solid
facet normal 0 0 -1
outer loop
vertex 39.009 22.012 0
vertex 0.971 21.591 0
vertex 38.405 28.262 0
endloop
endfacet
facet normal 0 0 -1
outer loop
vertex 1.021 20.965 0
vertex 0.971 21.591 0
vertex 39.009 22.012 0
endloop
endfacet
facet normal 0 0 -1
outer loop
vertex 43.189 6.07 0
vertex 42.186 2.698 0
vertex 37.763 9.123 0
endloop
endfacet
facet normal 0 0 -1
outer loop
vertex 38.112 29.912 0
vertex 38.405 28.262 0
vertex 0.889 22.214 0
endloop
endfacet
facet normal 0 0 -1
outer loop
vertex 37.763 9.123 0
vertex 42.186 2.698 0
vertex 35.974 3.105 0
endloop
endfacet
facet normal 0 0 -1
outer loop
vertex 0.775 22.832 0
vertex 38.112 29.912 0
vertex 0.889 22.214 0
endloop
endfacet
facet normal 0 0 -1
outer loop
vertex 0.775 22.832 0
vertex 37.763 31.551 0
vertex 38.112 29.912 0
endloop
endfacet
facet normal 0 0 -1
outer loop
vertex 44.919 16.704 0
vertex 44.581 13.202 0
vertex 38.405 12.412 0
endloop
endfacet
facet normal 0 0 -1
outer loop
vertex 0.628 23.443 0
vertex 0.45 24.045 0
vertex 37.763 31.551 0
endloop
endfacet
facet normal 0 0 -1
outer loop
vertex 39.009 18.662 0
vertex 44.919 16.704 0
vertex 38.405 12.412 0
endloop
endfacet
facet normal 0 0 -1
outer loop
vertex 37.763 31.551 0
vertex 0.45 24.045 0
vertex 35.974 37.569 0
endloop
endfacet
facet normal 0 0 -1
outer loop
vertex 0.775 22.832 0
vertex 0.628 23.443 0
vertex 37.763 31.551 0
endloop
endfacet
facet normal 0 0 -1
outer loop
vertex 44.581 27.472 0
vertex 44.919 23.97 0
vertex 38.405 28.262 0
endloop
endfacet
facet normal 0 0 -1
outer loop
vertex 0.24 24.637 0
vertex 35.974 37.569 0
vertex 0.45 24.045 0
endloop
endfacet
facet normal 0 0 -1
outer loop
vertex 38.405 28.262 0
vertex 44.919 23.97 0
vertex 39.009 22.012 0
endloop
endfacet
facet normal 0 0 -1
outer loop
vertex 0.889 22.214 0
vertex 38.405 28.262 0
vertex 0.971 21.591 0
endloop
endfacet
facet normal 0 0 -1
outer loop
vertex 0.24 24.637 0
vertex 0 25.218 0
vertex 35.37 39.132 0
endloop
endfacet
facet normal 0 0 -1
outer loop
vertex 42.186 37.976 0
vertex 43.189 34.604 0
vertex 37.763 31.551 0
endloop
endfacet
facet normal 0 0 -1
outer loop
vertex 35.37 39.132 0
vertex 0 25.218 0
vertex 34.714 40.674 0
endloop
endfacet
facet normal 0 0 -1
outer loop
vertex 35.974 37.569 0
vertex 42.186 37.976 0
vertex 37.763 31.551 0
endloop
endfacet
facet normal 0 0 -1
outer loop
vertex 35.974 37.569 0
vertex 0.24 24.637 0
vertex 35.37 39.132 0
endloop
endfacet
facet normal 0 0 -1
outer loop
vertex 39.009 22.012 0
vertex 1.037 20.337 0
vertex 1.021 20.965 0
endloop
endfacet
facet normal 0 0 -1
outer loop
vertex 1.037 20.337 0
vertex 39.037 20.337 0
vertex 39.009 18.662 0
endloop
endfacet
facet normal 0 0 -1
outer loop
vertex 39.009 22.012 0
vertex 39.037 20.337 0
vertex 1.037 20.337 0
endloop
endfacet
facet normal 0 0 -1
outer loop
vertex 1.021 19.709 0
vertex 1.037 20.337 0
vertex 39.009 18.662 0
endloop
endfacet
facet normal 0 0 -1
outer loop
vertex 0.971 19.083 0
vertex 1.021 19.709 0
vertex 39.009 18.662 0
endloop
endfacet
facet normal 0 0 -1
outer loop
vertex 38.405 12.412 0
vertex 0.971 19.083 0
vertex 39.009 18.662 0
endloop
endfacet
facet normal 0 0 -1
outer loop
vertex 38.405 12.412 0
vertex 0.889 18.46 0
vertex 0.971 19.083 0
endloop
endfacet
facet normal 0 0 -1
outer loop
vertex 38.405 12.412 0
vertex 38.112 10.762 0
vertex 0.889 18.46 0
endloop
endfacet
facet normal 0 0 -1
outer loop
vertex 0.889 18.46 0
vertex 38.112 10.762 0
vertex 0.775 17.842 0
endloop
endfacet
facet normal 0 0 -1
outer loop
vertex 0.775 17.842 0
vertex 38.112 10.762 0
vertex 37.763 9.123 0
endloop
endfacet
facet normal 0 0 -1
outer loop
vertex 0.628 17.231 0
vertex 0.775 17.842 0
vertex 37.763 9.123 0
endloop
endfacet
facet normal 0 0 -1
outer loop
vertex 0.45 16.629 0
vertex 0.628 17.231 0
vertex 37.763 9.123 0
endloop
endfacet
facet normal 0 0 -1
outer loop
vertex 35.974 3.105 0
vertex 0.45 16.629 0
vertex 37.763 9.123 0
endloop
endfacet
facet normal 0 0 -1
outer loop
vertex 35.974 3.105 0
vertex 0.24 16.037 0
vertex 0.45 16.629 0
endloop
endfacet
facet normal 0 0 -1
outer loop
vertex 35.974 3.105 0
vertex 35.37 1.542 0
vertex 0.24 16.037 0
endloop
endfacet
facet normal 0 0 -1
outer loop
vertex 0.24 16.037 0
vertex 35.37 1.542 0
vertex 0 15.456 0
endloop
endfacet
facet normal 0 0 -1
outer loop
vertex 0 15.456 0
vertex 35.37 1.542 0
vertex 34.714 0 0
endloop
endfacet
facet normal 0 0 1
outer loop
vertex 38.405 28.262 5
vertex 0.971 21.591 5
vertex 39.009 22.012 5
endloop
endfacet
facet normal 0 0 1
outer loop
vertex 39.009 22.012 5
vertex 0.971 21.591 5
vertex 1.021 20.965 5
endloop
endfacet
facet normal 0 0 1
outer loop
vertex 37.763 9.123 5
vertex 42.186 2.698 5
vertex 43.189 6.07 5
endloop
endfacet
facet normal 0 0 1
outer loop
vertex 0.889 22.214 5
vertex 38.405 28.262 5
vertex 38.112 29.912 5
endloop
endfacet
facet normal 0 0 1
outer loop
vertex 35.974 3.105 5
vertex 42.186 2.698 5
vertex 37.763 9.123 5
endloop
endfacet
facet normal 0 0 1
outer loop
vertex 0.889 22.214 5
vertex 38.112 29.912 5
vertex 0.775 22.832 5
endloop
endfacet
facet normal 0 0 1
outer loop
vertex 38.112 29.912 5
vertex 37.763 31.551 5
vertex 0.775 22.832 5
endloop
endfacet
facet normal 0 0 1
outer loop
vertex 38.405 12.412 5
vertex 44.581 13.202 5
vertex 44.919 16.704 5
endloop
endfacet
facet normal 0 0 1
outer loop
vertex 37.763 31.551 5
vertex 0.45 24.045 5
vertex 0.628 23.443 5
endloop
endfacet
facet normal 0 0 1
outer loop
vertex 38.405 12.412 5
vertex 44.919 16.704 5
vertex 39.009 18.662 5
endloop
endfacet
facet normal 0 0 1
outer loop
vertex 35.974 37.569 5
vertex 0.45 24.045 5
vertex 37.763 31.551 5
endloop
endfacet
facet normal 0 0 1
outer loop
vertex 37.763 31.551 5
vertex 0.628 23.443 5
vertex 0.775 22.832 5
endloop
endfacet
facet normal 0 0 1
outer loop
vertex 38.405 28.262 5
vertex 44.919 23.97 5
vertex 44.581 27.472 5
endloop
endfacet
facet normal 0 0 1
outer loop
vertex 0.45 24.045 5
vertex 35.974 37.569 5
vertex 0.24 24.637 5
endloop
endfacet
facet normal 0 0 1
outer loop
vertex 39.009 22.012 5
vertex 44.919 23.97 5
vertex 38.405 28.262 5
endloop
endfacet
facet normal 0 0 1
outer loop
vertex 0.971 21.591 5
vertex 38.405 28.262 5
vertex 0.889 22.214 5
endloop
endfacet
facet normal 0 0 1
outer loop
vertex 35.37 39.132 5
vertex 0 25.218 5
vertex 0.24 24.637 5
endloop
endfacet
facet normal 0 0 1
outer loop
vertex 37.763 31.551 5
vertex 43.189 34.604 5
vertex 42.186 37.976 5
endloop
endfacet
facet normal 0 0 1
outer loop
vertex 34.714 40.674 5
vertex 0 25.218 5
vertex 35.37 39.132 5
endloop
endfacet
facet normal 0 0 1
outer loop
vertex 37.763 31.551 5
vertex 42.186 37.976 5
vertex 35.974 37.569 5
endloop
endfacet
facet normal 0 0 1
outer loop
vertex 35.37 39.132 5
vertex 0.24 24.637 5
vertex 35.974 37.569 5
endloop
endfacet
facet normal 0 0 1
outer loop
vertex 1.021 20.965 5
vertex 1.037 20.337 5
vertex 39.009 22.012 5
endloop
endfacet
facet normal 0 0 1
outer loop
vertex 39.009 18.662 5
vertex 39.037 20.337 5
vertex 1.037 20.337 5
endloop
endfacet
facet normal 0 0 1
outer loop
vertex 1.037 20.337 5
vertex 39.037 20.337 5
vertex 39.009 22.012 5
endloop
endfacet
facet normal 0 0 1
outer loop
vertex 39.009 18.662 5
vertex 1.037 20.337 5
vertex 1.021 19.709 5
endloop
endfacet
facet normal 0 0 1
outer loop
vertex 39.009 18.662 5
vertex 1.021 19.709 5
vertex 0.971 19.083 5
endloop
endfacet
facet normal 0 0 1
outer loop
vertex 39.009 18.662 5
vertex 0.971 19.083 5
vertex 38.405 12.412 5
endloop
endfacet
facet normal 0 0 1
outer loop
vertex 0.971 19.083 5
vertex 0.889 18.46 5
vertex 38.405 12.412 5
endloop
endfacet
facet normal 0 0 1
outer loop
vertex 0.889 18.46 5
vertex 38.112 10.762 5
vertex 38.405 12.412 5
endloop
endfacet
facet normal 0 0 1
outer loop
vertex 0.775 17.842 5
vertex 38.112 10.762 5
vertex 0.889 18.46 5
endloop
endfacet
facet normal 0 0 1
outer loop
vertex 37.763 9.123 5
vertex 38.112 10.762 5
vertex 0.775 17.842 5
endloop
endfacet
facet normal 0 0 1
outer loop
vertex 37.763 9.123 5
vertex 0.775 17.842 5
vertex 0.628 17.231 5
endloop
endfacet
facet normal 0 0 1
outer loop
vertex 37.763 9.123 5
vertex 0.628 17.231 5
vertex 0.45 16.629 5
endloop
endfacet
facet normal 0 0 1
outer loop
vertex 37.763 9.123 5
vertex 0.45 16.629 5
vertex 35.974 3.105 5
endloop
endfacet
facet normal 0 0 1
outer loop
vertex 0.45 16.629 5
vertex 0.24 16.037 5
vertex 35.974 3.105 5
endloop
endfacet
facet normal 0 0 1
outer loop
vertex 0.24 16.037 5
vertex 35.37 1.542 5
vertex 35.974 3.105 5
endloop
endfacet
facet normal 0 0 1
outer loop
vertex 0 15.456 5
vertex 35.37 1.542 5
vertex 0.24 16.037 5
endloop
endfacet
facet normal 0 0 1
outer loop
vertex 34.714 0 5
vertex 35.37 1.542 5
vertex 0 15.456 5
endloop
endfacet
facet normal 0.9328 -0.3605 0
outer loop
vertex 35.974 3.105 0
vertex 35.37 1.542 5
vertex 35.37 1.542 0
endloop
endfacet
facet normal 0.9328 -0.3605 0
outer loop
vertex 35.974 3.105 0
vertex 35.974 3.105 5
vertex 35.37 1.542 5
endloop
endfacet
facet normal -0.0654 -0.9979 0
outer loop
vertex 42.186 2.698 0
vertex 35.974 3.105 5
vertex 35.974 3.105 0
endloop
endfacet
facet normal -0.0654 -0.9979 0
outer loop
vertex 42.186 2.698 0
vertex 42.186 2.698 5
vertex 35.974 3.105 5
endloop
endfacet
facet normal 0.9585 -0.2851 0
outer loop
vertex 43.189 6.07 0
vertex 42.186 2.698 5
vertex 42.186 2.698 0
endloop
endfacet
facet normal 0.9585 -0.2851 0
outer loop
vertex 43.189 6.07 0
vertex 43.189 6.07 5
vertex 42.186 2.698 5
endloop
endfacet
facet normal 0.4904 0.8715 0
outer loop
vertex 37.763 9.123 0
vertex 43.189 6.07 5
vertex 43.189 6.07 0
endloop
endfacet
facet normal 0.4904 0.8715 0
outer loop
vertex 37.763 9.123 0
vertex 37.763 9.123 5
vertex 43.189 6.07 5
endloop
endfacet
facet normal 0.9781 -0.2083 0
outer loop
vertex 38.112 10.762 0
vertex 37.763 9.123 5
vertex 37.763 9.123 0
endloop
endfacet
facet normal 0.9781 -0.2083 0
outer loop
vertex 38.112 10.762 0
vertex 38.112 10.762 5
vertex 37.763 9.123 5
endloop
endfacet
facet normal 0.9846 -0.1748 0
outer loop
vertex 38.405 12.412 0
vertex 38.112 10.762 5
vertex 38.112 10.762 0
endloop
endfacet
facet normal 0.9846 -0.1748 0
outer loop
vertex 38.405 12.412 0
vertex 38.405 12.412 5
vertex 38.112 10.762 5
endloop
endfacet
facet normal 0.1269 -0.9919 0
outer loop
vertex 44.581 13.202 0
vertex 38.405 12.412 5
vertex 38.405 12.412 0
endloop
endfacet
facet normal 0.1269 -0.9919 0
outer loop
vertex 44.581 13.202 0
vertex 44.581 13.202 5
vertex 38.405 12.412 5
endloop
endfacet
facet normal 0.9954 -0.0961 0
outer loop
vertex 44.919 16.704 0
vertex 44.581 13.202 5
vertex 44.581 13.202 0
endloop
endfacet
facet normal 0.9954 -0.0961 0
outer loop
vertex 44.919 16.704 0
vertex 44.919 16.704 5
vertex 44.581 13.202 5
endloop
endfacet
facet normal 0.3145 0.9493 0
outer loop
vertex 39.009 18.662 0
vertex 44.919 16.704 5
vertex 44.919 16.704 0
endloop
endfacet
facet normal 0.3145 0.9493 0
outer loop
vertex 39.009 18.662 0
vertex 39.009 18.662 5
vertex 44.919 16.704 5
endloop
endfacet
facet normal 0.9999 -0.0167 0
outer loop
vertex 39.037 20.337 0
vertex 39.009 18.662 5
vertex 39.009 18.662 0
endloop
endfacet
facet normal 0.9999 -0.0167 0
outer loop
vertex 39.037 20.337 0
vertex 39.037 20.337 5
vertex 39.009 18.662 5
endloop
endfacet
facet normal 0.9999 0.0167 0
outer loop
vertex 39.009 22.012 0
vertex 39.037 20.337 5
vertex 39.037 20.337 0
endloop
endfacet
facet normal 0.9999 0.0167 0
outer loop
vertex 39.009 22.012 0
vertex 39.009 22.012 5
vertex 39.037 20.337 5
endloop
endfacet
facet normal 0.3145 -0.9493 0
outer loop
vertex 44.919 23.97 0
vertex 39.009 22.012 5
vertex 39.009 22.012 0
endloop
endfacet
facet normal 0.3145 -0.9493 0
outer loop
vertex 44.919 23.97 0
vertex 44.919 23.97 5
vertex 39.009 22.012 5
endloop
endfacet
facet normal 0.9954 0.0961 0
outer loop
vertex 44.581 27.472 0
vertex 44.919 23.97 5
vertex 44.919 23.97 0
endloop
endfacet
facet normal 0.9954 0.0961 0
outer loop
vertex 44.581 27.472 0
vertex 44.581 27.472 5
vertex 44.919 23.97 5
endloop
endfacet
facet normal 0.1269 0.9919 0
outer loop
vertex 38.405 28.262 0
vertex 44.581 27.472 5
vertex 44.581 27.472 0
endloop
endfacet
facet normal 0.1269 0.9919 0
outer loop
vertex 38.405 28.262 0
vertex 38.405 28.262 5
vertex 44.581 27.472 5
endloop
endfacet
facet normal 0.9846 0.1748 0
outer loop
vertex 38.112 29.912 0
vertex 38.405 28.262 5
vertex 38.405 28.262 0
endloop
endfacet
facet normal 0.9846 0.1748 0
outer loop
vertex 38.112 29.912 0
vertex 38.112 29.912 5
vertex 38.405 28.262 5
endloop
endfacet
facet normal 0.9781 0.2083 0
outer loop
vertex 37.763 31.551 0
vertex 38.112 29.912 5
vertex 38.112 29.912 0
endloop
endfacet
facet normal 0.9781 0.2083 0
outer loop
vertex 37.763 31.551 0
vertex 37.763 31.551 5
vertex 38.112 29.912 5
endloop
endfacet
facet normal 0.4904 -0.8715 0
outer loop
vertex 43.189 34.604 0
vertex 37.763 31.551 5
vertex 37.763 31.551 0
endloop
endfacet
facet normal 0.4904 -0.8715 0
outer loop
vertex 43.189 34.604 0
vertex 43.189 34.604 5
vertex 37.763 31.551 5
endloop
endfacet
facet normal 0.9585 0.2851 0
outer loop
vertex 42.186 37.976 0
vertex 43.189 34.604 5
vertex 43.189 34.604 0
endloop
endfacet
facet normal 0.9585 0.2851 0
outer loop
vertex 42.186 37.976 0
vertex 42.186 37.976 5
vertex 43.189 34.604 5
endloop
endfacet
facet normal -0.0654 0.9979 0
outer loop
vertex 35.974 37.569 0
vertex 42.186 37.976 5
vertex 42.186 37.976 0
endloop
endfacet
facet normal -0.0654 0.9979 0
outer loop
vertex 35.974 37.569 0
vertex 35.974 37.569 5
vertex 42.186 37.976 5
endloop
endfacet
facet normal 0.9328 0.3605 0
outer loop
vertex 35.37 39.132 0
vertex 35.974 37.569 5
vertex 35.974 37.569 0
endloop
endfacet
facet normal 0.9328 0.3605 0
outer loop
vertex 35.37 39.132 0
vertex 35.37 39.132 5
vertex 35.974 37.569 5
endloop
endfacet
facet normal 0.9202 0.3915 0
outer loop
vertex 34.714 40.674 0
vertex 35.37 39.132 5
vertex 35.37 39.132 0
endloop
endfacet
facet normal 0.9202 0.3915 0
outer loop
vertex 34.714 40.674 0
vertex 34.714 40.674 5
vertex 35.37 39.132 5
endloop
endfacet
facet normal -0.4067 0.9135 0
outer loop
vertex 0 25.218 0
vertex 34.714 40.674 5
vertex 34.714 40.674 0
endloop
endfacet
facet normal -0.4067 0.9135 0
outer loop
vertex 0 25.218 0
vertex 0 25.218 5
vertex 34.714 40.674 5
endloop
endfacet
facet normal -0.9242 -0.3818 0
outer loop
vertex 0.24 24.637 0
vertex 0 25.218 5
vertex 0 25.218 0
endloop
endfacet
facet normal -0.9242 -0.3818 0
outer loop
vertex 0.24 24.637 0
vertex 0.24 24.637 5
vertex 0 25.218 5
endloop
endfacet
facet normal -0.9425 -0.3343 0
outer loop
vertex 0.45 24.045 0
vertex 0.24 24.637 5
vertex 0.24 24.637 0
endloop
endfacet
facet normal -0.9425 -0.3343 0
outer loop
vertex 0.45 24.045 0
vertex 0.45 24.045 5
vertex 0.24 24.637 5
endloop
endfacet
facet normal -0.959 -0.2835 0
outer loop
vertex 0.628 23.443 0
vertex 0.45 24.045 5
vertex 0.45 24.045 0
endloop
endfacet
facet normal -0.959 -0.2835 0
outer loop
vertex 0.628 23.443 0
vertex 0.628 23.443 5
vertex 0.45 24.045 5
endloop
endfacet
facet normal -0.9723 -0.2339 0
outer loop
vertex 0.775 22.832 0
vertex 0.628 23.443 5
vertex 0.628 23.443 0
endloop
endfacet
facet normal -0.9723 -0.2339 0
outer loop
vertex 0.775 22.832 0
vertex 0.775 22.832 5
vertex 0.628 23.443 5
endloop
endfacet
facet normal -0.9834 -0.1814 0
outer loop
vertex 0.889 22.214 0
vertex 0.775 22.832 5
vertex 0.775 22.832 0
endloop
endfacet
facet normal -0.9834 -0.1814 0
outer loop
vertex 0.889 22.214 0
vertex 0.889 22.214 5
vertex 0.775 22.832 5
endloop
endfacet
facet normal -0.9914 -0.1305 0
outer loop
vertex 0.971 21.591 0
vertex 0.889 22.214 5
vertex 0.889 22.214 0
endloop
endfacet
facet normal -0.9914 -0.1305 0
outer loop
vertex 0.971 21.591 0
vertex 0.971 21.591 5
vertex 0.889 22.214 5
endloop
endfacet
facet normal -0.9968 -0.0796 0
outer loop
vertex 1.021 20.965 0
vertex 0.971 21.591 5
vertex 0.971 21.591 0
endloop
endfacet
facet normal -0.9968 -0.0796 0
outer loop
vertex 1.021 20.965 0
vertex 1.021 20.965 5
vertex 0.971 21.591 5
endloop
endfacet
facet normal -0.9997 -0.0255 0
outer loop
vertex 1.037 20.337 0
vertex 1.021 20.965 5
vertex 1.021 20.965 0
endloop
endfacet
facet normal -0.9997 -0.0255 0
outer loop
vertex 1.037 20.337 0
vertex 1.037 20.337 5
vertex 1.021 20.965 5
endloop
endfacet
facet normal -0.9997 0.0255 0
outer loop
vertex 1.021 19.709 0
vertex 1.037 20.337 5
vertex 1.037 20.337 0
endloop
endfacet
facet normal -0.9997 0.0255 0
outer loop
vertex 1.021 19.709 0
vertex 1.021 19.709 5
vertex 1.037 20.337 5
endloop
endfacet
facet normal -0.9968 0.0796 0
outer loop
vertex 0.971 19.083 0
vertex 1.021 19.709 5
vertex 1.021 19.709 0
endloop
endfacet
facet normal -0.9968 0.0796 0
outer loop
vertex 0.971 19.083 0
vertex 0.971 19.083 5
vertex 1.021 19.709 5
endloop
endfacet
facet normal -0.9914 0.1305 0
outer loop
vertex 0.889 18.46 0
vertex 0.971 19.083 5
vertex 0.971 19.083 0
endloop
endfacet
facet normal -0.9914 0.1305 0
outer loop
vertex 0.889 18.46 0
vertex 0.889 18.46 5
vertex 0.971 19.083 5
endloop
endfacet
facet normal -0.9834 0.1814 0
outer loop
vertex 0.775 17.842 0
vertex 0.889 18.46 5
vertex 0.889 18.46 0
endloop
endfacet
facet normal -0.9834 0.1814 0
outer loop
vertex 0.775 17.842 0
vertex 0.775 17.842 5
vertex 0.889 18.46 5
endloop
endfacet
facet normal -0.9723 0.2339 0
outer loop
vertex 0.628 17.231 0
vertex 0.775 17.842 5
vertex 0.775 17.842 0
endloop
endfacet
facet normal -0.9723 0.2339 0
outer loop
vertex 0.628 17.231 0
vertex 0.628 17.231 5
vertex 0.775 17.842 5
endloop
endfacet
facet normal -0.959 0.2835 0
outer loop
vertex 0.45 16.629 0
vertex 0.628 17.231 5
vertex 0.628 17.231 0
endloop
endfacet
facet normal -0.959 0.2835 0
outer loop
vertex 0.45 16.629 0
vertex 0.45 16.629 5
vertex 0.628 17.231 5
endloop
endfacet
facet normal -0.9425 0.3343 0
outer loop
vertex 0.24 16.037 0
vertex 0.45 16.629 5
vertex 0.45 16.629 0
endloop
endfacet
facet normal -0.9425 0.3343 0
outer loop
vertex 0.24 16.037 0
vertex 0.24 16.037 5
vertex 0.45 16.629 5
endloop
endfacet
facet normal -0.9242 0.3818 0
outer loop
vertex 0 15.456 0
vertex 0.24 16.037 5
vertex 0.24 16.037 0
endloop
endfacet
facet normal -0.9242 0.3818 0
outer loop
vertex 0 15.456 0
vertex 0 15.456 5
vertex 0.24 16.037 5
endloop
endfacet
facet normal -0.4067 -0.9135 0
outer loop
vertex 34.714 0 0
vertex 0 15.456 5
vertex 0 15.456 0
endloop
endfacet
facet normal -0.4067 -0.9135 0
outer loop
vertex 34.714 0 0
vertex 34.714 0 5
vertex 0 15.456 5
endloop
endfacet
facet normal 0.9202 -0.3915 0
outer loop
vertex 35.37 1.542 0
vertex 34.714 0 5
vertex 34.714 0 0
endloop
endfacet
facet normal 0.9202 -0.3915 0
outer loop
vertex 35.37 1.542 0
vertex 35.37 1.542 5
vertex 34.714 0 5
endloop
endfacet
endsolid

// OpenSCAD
$fn = 32;

// ----------------------------------------------------------------------
// Gear sector: 4 teeth on 48 degrees
// ----------------------------------------------------------------------

// --- parameters (mm) ---
sector_angle = 48;        // sector angle, degrees
root_r = 50;              // root circle radius
tooth_h = 6;              // tooth height over the root circle
teeth = 4;                // number of teeth on the sector
hub_r = 12;               // hub bore radius
plate_t = 5;              // sector thickness, Z
arc_step = 3;             // sampling step of the root/hub arcs, degrees
fit_tol = 0.05;           // declared fit tolerance (prompt contract)
free_tol = 0.3;           // declared free tolerance (prompt contract)

tip_r = root_r + tooth_h;  // tip circle radius

profile = [[34.714, 0], [35.37, 1.542], [35.974, 3.105], [42.186, 2.698], [43.189, 6.07], [37.763, 9.123], [38.112, 10.762], [38.405, 12.412], [44.581, 13.202], [44.919, 16.704], [39.009, 18.662], [39.037, 20.337], [39.009, 22.012], [44.919, 23.97], [44.581, 27.472], [38.405, 28.262], [38.112, 29.912], [37.763, 31.551], [43.189, 34.604], [42.186, 37.976], [35.974, 37.569], [35.37, 39.132], [34.714, 40.674], [0, 25.218], [0.24, 24.637], [0.45, 24.045], [0.628, 23.443], [0.775, 22.832], [0.889, 22.214], [0.971, 21.591], [1.021, 20.965], [1.037, 20.337], [1.021, 19.709], [0.971, 19.083], [0.889, 18.46], [0.775, 17.842], [0.628, 17.231], [0.45, 16.629], [0.24, 16.037], [0, 15.456]];  // primary outline, 40 points, counter clockwise

// --- the one profile operation ---
linear_extrude(height = plate_t) polygon(points = profile);
